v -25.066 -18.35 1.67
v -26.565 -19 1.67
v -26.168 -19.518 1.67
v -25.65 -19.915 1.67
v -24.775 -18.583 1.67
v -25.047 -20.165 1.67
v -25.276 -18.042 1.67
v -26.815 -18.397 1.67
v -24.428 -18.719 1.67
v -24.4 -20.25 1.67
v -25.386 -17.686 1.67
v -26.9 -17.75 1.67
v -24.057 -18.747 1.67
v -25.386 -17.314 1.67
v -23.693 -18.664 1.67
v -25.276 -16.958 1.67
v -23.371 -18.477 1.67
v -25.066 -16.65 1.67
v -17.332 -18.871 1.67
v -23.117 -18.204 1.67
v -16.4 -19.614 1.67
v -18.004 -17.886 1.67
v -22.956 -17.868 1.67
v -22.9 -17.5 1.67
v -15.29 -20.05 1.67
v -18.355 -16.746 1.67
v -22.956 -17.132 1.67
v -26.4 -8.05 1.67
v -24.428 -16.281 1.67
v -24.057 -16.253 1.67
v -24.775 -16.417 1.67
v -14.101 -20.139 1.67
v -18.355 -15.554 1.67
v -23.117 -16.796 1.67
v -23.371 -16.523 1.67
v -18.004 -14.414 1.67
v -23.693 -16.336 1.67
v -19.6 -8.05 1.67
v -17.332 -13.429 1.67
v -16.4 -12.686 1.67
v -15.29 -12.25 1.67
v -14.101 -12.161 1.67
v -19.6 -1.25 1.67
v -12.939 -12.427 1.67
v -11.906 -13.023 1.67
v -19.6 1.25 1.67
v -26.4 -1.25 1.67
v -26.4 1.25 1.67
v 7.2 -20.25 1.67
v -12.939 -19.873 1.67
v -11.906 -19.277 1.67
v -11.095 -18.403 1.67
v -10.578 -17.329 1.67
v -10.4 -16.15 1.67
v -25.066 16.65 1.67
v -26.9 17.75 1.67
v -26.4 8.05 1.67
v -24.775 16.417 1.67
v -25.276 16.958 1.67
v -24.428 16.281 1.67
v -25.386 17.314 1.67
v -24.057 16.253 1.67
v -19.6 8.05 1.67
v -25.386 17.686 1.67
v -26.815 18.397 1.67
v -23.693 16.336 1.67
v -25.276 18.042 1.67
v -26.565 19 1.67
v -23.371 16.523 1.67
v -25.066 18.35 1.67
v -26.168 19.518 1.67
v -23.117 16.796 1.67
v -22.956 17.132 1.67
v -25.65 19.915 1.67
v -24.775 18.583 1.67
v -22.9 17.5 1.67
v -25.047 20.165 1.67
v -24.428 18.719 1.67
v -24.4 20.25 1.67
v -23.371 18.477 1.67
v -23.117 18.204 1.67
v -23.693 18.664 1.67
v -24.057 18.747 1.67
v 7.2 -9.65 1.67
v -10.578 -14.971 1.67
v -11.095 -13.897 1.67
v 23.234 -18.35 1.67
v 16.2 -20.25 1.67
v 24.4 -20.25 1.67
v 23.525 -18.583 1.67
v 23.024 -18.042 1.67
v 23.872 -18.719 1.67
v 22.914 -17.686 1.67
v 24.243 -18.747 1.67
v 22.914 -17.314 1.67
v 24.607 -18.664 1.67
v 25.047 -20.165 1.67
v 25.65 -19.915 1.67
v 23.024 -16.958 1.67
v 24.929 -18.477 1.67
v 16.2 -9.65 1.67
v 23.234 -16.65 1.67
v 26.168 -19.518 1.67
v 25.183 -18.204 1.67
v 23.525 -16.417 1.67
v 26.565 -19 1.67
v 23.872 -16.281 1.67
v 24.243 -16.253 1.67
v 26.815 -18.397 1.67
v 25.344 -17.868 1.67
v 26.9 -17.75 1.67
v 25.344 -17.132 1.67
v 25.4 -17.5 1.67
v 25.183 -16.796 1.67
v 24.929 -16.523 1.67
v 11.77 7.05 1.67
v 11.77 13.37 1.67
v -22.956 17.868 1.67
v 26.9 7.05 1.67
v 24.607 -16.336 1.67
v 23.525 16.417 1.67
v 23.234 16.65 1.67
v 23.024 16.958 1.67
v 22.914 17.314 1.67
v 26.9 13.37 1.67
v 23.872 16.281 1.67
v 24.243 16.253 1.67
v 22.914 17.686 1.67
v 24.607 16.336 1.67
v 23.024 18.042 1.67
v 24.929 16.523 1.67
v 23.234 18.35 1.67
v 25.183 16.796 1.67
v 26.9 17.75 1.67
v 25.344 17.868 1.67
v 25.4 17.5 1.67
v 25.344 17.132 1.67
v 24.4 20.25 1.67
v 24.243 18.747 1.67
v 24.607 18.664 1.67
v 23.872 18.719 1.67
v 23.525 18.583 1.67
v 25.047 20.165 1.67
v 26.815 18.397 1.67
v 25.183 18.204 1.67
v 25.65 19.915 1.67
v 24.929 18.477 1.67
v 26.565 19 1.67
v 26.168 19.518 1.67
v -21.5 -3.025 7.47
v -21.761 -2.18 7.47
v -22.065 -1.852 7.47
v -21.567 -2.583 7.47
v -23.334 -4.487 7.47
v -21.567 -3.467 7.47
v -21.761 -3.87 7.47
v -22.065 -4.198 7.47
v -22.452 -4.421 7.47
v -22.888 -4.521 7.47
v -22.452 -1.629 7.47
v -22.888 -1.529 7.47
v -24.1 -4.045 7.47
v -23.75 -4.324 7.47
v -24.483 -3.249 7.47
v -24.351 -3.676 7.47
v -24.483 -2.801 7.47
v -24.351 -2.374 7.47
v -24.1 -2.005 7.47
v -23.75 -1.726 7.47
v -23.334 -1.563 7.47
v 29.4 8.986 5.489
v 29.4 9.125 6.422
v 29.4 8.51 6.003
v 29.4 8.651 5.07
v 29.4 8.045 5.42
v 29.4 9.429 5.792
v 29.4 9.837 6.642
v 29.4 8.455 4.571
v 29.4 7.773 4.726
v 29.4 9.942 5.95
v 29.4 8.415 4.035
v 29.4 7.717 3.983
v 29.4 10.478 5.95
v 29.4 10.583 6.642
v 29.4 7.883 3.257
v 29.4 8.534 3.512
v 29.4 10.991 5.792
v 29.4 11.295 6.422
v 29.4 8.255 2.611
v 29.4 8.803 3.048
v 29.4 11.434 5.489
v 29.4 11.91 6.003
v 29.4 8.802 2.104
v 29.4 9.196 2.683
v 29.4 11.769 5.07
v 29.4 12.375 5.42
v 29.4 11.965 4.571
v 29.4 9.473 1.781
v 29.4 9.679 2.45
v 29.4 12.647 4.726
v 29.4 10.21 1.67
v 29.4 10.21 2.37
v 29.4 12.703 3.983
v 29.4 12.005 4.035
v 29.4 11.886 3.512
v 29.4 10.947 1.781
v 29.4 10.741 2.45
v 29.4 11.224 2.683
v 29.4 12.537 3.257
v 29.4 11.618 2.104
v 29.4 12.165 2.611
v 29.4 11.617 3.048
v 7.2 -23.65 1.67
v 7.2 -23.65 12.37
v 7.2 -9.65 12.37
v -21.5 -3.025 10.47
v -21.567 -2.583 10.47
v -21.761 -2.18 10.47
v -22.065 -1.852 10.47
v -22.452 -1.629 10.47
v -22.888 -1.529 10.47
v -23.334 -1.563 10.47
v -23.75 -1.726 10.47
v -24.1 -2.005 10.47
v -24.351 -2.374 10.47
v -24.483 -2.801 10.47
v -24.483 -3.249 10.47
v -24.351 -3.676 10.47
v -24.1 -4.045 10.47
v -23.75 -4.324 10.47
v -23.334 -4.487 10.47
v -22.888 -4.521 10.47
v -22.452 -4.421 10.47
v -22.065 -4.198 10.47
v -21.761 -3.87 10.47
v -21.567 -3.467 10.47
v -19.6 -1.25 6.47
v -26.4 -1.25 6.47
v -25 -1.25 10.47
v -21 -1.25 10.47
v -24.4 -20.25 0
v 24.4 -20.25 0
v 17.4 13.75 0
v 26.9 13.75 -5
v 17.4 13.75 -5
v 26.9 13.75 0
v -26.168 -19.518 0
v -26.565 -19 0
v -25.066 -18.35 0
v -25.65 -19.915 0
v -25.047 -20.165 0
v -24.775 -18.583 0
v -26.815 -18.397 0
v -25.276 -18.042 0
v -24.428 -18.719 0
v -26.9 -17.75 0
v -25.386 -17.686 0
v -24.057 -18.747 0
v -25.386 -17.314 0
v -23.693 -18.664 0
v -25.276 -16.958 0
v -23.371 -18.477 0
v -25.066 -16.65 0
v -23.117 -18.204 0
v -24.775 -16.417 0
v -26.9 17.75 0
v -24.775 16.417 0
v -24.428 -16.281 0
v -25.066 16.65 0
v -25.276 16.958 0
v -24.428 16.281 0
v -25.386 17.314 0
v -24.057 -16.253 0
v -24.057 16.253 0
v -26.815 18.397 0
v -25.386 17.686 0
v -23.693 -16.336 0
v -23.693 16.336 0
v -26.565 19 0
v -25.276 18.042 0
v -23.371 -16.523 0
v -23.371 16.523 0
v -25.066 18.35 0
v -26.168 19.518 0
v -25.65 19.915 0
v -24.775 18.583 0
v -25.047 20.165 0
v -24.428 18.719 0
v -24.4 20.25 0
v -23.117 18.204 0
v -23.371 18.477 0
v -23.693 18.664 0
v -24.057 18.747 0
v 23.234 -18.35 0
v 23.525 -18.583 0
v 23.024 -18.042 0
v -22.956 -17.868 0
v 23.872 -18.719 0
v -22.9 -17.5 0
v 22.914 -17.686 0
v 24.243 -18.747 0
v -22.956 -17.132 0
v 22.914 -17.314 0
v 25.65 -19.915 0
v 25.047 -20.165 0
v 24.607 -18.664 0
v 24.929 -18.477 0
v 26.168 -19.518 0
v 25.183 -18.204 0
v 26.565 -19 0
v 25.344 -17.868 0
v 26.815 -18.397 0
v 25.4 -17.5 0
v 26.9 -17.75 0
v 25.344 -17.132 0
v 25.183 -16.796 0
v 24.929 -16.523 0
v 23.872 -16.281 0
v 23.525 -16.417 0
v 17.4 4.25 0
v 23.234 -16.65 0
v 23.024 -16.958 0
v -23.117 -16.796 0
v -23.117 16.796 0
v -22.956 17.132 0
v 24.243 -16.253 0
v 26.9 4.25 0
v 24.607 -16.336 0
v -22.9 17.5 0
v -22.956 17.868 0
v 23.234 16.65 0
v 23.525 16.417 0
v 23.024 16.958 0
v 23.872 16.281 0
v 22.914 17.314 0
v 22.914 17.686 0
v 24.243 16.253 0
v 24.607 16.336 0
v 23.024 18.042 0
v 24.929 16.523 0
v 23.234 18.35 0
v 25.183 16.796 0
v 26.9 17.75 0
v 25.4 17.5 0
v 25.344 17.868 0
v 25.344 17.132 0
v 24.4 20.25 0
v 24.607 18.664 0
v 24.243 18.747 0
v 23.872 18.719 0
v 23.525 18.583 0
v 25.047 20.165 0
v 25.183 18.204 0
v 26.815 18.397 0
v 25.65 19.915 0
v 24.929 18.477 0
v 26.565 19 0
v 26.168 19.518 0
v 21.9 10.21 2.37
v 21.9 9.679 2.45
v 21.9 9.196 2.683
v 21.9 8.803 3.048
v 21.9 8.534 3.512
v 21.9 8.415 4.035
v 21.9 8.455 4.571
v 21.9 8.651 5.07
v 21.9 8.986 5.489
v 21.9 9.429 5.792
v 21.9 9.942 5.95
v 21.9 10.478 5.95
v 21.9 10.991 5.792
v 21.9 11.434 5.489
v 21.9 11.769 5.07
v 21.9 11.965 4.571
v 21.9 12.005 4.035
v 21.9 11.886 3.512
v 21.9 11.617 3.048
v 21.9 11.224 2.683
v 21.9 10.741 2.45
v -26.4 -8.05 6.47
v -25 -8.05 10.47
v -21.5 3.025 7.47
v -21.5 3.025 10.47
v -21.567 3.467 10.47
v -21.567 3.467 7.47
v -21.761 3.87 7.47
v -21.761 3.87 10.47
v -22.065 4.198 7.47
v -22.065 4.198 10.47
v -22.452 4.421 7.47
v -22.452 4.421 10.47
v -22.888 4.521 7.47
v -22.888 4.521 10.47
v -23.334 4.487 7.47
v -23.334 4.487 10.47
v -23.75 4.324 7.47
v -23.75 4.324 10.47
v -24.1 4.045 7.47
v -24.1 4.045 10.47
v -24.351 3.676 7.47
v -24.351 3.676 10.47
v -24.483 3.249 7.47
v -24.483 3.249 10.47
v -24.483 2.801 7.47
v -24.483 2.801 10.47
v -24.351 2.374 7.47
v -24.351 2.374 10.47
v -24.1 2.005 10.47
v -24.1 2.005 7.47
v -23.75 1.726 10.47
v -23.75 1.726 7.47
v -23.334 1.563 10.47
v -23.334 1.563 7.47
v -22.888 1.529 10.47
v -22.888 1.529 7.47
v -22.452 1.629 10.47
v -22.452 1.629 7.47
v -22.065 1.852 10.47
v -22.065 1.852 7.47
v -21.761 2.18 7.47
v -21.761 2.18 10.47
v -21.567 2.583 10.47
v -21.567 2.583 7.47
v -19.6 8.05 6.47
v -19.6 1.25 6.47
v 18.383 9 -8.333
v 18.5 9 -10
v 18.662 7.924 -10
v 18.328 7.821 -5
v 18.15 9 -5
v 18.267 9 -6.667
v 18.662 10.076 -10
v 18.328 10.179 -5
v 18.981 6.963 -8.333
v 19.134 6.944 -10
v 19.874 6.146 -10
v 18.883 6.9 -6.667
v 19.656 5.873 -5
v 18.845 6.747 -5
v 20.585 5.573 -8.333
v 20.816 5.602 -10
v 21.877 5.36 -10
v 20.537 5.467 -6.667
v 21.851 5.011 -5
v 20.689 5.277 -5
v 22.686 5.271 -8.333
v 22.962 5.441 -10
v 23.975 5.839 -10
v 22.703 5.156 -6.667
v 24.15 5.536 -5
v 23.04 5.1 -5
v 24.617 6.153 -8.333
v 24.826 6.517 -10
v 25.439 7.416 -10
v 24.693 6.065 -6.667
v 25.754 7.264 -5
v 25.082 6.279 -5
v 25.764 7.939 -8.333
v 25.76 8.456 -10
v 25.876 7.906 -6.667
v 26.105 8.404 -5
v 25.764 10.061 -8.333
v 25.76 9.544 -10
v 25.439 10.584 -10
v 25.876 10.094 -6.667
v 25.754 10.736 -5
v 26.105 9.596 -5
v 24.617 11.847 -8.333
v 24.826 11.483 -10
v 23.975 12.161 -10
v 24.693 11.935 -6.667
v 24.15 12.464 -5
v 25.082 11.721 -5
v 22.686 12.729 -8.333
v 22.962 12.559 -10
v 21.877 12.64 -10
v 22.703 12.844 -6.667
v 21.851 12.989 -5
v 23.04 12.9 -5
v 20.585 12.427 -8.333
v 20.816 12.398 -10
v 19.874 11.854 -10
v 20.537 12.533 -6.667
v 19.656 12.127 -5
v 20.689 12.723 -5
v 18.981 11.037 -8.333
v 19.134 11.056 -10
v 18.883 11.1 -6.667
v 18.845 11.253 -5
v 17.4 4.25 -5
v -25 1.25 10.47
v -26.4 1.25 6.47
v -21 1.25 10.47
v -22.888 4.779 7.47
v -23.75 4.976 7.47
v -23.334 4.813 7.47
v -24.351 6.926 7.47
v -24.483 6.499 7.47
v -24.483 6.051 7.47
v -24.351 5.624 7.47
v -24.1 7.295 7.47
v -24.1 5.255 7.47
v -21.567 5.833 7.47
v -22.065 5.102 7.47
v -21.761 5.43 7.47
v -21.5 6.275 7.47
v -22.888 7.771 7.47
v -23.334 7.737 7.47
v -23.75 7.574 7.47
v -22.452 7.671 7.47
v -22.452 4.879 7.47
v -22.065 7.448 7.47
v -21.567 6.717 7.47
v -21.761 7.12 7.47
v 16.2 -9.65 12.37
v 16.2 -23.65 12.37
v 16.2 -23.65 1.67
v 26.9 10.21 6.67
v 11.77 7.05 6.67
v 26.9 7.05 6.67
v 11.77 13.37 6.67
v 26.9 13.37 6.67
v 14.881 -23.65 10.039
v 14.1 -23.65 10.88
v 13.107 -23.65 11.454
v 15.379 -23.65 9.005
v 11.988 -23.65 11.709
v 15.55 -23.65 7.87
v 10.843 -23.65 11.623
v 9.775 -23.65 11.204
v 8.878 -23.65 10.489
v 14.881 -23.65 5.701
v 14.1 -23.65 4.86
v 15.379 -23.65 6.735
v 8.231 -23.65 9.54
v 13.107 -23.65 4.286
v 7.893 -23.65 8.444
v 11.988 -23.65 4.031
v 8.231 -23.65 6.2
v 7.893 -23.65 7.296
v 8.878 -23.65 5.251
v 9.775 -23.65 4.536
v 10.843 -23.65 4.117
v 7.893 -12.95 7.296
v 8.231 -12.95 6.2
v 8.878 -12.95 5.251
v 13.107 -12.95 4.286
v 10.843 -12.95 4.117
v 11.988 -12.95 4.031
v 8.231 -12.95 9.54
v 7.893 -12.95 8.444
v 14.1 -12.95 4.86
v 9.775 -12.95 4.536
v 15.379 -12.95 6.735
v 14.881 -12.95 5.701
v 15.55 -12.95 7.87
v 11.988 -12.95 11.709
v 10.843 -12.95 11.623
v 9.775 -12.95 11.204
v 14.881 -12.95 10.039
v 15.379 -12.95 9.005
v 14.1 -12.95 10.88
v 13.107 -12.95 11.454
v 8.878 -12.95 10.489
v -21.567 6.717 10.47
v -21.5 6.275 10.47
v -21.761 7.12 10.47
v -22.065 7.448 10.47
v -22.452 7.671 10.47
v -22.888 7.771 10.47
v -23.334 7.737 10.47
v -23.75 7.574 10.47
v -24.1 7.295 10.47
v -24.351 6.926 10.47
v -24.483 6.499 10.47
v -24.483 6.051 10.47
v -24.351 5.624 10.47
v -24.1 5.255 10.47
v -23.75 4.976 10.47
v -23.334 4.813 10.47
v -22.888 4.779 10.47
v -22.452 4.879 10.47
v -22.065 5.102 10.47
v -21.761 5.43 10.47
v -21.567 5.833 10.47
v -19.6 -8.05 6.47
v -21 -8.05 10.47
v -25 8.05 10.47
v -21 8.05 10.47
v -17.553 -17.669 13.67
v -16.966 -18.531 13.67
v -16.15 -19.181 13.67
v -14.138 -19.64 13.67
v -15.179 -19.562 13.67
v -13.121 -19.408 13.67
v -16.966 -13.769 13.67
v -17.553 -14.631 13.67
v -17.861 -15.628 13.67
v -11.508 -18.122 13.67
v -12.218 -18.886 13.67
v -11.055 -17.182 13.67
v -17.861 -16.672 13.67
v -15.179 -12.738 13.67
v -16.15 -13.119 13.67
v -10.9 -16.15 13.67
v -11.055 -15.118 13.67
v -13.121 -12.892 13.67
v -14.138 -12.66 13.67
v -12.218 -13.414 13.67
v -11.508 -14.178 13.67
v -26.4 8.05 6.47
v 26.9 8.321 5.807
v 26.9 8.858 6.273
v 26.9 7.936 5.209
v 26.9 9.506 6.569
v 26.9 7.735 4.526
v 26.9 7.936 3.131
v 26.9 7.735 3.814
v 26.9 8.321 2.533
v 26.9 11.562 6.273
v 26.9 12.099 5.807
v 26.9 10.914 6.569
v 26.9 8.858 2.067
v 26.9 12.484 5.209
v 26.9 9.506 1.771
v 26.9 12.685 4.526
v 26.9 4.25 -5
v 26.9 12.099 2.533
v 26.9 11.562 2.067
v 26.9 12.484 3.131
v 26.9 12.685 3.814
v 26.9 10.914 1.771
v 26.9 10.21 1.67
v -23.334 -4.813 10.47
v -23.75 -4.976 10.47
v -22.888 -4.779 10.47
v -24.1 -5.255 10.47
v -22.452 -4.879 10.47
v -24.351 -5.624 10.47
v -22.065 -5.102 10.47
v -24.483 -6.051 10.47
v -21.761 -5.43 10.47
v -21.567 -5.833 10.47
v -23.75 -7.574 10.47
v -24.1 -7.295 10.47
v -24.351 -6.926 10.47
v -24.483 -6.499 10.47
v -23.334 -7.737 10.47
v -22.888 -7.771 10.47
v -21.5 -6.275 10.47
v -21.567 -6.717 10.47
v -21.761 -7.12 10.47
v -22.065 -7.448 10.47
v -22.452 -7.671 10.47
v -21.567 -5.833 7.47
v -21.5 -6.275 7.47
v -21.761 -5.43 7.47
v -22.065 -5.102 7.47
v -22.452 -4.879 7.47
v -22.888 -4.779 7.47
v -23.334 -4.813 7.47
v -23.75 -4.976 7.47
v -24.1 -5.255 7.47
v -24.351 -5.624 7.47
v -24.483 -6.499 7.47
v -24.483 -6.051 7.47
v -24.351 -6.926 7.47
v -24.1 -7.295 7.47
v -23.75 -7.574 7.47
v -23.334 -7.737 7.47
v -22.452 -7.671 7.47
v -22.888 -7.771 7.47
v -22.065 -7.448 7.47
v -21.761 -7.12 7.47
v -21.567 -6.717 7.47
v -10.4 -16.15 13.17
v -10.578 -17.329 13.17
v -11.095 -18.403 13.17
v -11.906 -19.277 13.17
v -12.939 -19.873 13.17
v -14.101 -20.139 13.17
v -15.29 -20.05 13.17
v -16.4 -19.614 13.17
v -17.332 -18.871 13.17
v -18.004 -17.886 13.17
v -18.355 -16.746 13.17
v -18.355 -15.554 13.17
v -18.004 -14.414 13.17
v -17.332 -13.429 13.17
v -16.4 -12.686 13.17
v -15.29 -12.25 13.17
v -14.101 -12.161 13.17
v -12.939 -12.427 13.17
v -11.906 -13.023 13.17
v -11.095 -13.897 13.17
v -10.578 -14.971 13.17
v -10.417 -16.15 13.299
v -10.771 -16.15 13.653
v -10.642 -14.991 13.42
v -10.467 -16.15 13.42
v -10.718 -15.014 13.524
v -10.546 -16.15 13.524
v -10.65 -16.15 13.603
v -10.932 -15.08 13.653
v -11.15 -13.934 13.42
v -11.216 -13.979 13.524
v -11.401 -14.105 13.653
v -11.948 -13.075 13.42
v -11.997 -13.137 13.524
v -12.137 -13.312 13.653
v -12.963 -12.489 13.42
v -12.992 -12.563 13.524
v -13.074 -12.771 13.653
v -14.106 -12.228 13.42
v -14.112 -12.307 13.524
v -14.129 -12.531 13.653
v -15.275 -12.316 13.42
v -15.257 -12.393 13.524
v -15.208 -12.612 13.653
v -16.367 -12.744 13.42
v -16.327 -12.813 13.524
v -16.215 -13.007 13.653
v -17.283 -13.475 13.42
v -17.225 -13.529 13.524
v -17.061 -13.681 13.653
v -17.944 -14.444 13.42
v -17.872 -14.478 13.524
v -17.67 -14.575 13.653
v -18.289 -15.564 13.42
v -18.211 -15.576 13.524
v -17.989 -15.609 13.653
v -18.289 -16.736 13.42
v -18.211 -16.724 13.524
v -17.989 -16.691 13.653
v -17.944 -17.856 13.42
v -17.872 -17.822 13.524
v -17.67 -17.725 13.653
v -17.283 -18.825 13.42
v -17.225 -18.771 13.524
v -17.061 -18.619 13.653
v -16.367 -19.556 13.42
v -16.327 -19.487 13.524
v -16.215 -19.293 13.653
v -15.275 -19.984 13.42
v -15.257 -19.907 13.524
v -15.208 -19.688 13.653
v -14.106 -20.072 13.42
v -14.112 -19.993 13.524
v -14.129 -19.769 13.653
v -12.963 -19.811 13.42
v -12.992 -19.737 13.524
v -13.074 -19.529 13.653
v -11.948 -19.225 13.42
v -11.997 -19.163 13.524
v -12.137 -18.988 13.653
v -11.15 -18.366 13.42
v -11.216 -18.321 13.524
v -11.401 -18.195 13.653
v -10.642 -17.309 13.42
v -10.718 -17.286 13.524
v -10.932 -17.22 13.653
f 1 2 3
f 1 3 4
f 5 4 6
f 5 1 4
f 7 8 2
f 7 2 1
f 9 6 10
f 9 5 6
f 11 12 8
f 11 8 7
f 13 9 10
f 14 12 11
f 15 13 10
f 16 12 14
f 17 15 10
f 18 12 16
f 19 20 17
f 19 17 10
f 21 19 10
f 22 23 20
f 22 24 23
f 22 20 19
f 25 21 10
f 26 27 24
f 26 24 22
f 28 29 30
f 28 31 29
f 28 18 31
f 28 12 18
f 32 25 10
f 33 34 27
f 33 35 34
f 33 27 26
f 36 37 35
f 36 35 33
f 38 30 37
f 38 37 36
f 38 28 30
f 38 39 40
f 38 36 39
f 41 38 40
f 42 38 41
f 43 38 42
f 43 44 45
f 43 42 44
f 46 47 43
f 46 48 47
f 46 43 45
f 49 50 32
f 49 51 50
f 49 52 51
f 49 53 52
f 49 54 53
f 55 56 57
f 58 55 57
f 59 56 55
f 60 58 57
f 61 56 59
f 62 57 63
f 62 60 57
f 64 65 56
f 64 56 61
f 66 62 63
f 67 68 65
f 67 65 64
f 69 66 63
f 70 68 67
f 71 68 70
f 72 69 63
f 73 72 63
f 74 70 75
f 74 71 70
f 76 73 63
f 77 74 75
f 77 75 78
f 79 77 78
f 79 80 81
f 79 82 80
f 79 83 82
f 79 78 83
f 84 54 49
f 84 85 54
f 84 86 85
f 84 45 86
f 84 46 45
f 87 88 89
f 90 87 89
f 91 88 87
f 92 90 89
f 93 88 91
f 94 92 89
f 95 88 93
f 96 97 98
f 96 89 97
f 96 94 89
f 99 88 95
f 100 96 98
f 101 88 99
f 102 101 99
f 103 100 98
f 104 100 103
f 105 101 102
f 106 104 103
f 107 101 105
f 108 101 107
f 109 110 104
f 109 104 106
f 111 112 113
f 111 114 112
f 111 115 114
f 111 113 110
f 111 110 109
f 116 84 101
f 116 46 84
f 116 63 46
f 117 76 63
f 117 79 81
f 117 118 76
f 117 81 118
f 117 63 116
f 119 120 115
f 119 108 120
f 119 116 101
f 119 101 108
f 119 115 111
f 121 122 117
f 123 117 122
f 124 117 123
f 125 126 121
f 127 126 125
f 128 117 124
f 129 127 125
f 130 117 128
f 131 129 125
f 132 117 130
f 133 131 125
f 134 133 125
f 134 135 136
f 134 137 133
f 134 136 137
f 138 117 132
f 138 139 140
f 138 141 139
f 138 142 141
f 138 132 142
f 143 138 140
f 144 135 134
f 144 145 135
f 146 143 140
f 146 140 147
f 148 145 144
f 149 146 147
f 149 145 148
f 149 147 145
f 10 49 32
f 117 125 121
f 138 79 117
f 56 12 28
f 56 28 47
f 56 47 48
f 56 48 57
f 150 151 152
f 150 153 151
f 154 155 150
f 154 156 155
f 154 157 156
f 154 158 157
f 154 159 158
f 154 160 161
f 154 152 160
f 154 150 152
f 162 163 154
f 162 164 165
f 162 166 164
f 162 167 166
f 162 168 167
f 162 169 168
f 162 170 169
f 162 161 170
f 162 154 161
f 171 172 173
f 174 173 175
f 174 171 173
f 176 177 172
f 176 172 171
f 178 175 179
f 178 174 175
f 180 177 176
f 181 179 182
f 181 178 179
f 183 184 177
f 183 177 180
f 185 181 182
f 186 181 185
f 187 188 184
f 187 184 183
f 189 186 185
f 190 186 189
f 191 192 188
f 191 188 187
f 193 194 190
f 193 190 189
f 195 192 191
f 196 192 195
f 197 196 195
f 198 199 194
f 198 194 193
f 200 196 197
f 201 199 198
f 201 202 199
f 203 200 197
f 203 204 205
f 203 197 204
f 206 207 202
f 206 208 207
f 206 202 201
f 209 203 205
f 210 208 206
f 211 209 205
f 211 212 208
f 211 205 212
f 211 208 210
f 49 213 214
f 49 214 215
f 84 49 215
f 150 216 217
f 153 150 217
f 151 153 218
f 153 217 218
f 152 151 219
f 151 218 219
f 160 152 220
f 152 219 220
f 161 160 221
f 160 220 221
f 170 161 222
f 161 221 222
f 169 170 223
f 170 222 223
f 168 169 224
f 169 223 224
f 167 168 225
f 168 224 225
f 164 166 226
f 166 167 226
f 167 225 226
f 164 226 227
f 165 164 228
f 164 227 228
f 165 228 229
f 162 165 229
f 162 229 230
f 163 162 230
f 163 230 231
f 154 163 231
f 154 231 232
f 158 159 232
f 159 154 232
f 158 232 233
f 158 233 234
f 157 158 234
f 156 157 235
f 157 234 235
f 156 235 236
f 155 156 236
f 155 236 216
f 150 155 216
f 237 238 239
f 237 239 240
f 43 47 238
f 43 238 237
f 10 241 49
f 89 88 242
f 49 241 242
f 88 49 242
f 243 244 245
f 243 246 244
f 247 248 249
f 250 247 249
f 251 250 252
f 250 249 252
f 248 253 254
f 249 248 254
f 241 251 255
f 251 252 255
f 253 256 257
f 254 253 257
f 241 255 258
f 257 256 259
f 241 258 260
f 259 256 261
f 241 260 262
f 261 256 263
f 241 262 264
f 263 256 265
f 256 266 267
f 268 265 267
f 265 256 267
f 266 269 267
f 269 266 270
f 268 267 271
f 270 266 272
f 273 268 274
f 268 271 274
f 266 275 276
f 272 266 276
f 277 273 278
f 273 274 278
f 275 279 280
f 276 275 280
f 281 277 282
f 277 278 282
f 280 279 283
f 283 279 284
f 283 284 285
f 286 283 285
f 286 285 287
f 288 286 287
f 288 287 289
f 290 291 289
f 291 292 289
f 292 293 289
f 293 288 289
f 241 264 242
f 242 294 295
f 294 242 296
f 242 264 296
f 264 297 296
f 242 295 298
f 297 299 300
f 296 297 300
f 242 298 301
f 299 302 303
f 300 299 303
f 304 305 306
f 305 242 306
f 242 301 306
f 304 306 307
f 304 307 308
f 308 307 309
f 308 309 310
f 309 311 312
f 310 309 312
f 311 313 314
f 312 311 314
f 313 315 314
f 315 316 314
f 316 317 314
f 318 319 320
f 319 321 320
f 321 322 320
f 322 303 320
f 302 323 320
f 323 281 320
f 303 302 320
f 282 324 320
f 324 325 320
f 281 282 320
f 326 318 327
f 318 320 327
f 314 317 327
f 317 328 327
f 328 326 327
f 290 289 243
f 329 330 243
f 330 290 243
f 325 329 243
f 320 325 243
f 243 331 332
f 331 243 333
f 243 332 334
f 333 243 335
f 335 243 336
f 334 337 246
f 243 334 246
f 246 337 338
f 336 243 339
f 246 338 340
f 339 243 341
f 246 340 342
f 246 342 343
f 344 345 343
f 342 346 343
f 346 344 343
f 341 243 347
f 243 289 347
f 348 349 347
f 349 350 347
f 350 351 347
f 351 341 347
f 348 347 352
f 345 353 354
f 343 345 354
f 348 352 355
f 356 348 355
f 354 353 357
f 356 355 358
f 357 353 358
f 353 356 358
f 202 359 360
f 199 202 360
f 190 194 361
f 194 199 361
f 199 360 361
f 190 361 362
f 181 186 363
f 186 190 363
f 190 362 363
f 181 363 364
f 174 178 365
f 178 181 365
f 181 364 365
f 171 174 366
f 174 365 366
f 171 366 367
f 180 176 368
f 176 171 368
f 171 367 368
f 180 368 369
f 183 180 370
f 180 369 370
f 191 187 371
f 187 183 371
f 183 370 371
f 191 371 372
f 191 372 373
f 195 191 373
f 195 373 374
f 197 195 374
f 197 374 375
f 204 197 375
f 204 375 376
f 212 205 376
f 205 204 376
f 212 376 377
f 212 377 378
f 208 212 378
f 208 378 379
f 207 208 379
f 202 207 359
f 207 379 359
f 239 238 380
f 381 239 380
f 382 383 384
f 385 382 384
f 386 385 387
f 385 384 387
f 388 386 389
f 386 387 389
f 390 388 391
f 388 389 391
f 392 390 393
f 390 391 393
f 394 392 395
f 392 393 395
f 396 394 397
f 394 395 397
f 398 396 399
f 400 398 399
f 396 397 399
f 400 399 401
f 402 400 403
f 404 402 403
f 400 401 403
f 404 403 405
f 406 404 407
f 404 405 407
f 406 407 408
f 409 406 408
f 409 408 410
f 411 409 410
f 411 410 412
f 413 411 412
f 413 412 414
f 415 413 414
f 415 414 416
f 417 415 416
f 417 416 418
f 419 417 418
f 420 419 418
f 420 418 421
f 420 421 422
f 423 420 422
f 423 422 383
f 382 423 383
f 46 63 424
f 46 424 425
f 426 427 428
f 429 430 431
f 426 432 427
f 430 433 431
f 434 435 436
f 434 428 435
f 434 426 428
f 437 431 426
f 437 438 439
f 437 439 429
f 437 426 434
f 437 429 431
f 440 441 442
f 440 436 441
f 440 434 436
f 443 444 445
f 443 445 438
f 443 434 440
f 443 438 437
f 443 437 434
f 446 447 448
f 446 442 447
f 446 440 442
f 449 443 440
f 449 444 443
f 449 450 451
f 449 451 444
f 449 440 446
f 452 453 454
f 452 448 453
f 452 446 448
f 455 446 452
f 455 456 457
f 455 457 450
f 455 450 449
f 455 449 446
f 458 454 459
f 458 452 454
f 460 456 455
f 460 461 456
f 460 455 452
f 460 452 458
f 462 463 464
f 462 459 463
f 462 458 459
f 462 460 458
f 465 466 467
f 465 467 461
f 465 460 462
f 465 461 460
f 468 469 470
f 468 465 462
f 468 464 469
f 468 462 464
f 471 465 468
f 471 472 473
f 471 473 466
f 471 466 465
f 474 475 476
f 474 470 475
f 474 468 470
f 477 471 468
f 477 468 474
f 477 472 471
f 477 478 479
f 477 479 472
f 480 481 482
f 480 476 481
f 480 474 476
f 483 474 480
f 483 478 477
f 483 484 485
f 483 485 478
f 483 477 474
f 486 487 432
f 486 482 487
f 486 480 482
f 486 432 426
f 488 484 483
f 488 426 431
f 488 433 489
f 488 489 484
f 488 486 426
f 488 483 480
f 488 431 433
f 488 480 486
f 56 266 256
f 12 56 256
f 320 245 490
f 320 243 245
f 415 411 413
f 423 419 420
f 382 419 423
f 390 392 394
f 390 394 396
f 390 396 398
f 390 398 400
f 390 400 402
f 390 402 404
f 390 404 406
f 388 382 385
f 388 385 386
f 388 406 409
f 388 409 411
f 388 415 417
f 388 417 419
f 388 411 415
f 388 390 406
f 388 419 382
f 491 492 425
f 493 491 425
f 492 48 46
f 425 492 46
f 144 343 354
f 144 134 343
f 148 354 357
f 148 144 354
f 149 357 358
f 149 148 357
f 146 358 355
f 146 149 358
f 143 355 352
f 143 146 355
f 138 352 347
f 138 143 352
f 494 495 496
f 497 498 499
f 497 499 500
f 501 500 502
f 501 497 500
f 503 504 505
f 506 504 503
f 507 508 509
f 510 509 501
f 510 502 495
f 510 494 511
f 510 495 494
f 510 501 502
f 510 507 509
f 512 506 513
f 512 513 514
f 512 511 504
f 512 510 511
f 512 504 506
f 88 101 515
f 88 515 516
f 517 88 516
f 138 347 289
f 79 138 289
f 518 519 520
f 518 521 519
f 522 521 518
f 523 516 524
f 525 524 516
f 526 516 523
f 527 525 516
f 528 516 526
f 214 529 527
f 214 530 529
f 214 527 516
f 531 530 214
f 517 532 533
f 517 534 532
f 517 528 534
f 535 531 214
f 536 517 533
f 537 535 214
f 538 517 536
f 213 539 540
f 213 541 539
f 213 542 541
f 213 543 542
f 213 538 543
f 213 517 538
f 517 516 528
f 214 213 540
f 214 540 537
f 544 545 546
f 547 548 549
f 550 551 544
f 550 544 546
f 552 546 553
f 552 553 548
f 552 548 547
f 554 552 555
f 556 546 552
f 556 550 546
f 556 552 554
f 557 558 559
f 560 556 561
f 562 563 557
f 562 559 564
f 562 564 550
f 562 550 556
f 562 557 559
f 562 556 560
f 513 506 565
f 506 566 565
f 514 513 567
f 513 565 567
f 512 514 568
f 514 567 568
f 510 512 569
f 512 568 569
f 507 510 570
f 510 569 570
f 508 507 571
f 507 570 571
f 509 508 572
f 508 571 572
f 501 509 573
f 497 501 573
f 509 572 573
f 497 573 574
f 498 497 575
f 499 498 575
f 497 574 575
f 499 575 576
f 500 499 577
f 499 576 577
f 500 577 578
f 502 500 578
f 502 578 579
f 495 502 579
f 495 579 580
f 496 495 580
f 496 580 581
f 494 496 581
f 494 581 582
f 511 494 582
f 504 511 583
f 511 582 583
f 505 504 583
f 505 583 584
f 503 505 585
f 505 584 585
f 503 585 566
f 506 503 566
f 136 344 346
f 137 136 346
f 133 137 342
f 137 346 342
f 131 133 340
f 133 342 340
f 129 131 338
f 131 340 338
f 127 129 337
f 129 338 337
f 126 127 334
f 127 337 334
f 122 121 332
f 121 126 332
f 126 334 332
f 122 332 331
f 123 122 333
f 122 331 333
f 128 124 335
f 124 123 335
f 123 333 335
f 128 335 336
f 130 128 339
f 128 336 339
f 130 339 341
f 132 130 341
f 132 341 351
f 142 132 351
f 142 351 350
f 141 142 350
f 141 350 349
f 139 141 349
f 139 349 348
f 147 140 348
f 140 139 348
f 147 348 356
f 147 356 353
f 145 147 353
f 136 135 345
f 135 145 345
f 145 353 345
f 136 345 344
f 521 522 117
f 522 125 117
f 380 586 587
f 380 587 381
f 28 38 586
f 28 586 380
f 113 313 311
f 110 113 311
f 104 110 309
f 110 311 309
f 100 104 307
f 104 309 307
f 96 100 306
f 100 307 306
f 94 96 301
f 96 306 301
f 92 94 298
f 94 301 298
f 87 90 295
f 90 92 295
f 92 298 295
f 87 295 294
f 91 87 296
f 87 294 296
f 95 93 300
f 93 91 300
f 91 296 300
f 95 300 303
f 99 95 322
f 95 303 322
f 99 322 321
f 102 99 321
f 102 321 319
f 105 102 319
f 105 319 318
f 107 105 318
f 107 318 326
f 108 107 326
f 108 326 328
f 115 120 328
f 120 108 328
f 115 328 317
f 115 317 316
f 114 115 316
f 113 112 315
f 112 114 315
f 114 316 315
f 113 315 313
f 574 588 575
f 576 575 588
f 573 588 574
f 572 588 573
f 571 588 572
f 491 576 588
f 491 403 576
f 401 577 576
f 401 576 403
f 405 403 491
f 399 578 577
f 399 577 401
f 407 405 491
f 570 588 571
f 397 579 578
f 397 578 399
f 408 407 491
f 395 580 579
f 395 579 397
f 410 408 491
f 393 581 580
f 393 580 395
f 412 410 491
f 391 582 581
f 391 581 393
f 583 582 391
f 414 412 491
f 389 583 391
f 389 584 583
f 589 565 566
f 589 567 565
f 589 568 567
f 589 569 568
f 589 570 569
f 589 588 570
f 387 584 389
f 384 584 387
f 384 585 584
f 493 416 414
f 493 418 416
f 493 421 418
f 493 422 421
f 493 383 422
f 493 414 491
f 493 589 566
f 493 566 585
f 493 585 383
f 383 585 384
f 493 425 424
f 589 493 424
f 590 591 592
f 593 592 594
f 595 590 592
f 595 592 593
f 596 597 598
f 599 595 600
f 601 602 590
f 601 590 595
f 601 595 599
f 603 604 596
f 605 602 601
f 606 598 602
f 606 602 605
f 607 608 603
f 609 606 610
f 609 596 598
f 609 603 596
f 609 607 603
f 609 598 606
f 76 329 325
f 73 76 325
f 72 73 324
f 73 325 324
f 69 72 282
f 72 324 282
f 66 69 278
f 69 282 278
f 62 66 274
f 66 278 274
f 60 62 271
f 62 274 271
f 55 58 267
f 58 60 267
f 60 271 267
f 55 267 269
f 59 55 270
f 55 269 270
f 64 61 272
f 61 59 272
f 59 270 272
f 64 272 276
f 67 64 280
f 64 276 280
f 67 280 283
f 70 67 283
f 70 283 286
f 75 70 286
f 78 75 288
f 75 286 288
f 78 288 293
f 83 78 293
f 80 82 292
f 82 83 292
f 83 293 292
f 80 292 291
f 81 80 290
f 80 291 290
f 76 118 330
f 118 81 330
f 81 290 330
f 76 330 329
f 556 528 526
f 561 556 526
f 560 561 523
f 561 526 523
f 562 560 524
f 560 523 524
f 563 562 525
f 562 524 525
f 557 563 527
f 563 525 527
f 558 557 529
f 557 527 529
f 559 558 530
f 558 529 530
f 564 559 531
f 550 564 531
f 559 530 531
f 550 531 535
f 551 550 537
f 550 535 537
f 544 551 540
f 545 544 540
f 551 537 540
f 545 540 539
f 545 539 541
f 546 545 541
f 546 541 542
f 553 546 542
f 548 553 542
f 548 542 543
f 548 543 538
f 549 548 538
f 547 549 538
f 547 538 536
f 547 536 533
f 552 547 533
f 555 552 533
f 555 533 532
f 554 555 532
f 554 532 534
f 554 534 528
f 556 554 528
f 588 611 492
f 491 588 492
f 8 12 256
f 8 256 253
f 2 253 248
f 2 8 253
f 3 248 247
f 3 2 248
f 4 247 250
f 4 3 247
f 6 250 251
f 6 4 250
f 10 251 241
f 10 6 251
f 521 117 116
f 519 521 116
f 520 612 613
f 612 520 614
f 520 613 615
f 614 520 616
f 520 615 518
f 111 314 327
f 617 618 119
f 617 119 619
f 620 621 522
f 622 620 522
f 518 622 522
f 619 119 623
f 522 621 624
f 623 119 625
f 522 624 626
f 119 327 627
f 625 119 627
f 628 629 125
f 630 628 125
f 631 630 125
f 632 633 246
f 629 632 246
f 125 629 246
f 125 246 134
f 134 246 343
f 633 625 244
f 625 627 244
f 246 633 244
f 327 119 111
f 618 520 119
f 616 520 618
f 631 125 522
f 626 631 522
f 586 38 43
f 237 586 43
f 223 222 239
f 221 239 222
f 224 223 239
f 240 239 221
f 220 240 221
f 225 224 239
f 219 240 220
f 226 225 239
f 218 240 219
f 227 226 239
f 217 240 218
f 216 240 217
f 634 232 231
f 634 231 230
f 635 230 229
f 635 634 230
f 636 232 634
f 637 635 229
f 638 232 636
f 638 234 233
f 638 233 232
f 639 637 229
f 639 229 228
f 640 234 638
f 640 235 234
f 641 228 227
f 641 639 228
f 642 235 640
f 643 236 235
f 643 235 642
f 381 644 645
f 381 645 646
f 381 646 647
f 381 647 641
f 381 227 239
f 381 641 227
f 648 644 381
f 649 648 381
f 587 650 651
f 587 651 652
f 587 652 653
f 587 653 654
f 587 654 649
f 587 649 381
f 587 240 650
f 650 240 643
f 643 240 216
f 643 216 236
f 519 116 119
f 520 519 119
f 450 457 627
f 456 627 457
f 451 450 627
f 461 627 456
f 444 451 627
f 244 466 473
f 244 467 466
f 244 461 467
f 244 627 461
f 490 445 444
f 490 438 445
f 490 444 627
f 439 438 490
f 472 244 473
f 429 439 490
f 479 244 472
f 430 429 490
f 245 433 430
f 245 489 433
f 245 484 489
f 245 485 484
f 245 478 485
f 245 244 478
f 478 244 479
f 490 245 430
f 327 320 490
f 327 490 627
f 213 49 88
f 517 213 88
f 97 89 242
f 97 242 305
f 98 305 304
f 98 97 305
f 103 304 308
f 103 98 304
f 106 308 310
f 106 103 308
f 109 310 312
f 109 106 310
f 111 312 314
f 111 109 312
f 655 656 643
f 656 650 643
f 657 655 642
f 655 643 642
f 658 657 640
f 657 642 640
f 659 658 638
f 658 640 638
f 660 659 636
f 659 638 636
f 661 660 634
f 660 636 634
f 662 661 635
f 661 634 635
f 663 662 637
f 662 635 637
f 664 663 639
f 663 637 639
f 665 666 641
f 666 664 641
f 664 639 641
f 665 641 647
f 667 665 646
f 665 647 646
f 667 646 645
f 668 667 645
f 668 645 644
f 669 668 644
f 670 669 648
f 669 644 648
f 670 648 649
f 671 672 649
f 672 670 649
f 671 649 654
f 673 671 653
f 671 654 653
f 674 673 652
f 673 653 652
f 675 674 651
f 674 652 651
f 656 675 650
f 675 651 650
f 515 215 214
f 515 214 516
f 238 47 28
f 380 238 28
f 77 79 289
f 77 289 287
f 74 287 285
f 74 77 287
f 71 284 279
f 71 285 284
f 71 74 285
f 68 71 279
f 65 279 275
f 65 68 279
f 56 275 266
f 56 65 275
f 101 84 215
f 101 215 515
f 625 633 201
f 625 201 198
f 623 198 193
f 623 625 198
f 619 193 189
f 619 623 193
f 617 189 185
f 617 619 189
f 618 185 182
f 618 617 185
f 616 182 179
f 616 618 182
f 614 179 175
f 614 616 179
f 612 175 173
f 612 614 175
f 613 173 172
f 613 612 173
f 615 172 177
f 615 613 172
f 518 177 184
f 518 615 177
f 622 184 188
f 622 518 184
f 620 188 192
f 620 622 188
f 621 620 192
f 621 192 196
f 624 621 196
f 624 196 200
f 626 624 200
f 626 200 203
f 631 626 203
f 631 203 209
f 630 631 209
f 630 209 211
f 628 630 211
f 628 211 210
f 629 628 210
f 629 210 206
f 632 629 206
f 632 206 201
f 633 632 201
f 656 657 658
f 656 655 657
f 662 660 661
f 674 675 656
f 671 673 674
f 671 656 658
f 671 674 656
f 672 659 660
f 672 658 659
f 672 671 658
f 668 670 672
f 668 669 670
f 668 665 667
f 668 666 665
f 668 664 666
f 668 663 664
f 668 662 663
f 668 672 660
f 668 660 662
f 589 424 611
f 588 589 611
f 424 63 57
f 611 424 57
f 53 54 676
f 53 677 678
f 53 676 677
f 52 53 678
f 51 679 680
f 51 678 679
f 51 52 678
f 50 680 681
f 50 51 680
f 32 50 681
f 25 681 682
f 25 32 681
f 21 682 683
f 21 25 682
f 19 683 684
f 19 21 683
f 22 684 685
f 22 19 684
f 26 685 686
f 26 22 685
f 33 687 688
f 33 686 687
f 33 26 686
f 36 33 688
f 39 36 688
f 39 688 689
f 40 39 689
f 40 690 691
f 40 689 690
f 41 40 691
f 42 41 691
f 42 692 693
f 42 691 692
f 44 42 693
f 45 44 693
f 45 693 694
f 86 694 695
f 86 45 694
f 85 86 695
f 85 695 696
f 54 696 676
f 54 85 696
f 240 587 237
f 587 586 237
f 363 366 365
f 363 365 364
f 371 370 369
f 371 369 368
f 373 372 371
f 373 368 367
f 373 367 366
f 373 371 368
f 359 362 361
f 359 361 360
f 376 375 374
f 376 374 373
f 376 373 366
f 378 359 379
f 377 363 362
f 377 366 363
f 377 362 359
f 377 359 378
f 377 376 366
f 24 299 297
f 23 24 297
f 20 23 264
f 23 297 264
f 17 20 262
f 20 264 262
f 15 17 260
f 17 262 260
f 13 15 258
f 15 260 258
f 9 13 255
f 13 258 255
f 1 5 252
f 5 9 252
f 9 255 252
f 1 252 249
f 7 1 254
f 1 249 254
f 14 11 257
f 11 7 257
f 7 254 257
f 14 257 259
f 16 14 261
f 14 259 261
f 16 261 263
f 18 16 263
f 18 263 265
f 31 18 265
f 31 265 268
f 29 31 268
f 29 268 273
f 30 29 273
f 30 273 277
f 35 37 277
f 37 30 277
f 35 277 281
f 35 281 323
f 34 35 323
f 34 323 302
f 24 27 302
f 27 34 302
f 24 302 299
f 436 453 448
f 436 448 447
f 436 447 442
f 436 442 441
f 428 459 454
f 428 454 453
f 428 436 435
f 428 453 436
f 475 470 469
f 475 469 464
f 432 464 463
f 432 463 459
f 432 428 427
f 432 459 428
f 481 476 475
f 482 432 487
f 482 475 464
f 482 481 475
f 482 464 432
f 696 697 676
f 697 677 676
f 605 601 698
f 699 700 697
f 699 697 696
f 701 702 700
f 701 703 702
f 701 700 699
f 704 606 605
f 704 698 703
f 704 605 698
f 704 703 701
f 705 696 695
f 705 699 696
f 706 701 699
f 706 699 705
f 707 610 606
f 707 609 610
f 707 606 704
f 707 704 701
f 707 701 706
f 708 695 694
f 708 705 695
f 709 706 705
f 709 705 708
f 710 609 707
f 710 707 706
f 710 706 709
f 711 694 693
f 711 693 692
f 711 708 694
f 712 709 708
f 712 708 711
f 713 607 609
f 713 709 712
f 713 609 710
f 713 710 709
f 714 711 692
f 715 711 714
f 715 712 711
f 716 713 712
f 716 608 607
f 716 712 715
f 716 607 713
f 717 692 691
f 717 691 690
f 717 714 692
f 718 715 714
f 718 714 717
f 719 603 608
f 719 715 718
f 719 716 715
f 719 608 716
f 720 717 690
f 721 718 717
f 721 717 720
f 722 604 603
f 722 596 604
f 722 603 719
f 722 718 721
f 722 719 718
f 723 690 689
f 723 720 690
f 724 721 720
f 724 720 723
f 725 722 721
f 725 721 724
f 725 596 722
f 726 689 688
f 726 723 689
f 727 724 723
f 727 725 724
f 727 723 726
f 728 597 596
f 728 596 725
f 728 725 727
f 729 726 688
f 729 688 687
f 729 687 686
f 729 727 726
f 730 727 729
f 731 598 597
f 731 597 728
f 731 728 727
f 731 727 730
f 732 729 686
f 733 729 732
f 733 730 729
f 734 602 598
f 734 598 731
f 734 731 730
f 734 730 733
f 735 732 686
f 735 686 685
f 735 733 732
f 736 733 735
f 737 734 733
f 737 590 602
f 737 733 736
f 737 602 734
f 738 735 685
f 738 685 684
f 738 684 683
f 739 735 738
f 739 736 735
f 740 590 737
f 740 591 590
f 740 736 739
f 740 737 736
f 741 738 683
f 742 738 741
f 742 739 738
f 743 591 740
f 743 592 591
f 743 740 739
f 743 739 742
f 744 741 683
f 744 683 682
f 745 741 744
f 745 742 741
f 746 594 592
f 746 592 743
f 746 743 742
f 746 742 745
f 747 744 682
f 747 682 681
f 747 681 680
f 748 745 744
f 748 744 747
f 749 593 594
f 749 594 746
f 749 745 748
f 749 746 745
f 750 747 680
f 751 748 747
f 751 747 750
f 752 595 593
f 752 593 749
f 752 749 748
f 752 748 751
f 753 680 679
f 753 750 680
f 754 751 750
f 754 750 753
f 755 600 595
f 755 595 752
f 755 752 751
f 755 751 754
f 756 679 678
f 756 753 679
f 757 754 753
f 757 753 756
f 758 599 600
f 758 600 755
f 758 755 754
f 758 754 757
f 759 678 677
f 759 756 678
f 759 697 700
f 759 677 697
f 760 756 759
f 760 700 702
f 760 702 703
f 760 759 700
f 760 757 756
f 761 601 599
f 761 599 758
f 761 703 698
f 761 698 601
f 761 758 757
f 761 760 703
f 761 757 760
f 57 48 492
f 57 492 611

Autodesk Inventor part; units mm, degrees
ref_plane "YZ Plane" through (0, 0, 0) normal (1, 0, 0) x (0, 1, 0)
ref_plane "XZ Plane" through (0, 0, 0) normal (0, 1, 0) x (-1, 0, 0)
sketch "Base" plane through (0, 0, 0) normal (0, 0, 1) x (1, 0, 0)
  line L0 (-26.9, -20.25) -> (26.9, -20.25)
  line L1 (26.9, -20.25) -> (26.9, 20.25)
  line L2 (26.9, 20.25) -> (-26.9, 20.25)
  line L3 (-26.9, 20.25) -> (-26.9, -20.25)
  line L4 (-26.9, -20.25) -> (26.9, 20.25) construction
  line L5 (26.9, -20.25) -> (-26.9, 20.25) construction
  line L6 (-25.4, 16.25) -> (-22.9, 16.25) construction
  line L7 (-22.9, 16.25) -> (-22.9, 18.75) construction
  line L8 (-22.9, 18.75) -> (-25.4, 18.75) construction
  line L9 (-25.4, 18.75) -> (-25.4, 16.25) construction
  line L10 (-25.4, 16.25) -> (-22.9, 18.75) construction
  line L11 (-22.9, 16.25) -> (-25.4, 18.75) construction
  circle A0 centre (-24.15, 17.5) radius 1.25
  line L12 (-26.9, 0) -> (0, 0) construction
  line L13 (0, 20.25) -> (0, 0) construction
  circle A1 centre (-24.15, -17.5) radius 1.25
  circle A2 centre (24.15, 17.5) radius 1.25
  circle A3 centre (24.15, -17.5) radius 1.25
  point P0 (-25.4, 17.5)
  dimension "d0" = 53.8
  dimension "d1" = 40.5
  dimension "d2" = 1.5
  dimension "d3" = 1.5
  dimension "d4" = 2.5
extrude "BaseFeature" add sketch "Base" along normal blind 1.67
fillet "Fillet1" radius 2.5 4 edges at (-26.9, -20.25, 0.835) (26.9, -20.25, 0.835) (-26.9, 20.25, 0.835) (26.9, 20.25, 0.835)
sketch "Sketch2" plane through (0, 0, 1.67) normal (0, 0, 1) x (1, 0, 0)
  line L0 (-26.9, 17.75) -> (-26.9, -17.75) projected
  line L1 (-26.9, 0) -> (0, 0) construction
  line L2 (-26.4, 8.05) -> (-19.6, 8.05)
  line L3 (-19.6, 8.05) -> (-19.6, 1.25)
  line L4 (-19.6, 1.25) -> (-26.4, 1.25)
  line L5 (-26.4, 1.25) -> (-26.4, 8.05)
  line L6 (-26.4, -8.05) -> (-19.6, -8.05)
  line L7 (-19.6, -8.05) -> (-19.6, -1.25)
  line L8 (-19.6, -1.25) -> (-26.4, -1.25)
  line L9 (-26.4, -1.25) -> (-26.4, -8.05)
  dimension "d8" = 1.25
  dimension "d9" = 0.5
  dimension "d10" = 6.8
extrude "Extrusion2" add sketch "Sketch2" along normal blind 4.8
ref_plane "Work Plane1" through (0, 0, 10.47) normal (0, 0, 1) x (1, 0, 0)
sketch "Sketch3" plane through (0, 0, 10.47) normal (0, 0, 1) x (1, 0, 0)
  line L0 (-26.4, 8.05) -> (-19.6, 8.05) projected
  line L1 (-23, 8.05) -> (-23, 1.25) construction
  line L2 (-19.6, 1.25) -> (-26.4, 1.25) projected
  line L3 (-37.66, 0) -> (37.66, 0) construction
  line L4 (-26.4, 1.25) -> (-19.6, 1.25) projected
  line L5 (-19.6, 1.25) -> (-19.6, 8.05) projected
  line L6 (-19.6, 8.05) -> (-26.4, 8.05) projected
  line L7 (-26.4, 8.05) -> (-26.4, 1.25) projected
  line L8 (-25, 8.05) -> (-21, 8.05)
  line L9 (-21, 8.05) -> (-21, 1.25)
  line L10 (-21, 1.25) -> (-25, 1.25)
  line L11 (-25, 1.25) -> (-25, 8.05)
  point P0 (0, 0)
  dimension "d14" = 4
sketch "Sketch4" plane through (0, 0, 6.47) normal (0, 0, 1) x (1, 0, 0)
  line L0 (-26.4, 1.25) -> (-19.6, 1.25) projected
  line L1 (-19.6, 1.25) -> (-19.6, 8.05) projected
  line L2 (-19.6, 8.05) -> (-26.4, 8.05) projected
  line L3 (-26.4, 8.05) -> (-26.4, 1.25) projected
  point P0 (0, 0)
loft "Loft1" add profiles "Sketch3" section 2 edges at (-23, 1.25, 6.47) (-19.6, 4.65, 6.47) (-23, 8.05, 6.47) (-26.4, 4.65, 6.47) contours L0 L9 L2 L11
mirror "Mirror1" about plane through (0, 0, 0) normal (0, 1, 0) of "Loft1"
sketch "Sketch5" plane through (-25, 1.25, 10.47) normal (0, 0, 1) x (1, 0, 0)
  line L0 (0, 6.8) -> (0, 0) projected
  line L1 (0, 0) -> (4, 0) projected
  line L2 (4, 0) -> (4, 6.8) projected
  line L3 (4, 6.8) -> (0, 6.8) projected
  line L4 (-12.66, -1.25) -> (62.66, -1.25) construction
  line L5 (2, 6.8) -> (2, 0) construction
  circle A0 centre (2, 5.025) radius 1.5
  line L6 (0, 3.4) -> (4, 3.4) construction
  circle A1 centre (2, 1.775) radius 1.5
  point P0 (25, -1.25)
  dimension "d19" = 3
  dimension "d20" = 3.25
extrude "Extrusion3" cut sketch "Sketch5" against normal blind 3 contours A0 | A1
mirror "Mirror2" about plane through (0, 0, 0) normal (0, 1, 0) of "Extrusion3"
sketch "Sketch6" plane through (0, 0, 1.67) normal (0, 0, 1) x (1, 0, 0)
  line L0 (-24.4, -20.25) -> (24.4, -20.25) projected
  line L1 (-26.9, 17.75) -> (-26.9, -17.75) projected
  circle A0 centre (-14.4, -16.15) radius 4
  line L2 (-18.4, -16.15) -> (-18.4, -20.25) construction
  point P0 (0, 0)
  dimension "d23" = 8
  dimension "d24" = 4.1
  dimension "d25" = 8.5
extrude "Extrusion4" add sketch "Sketch6" along normal blind 12
fillet "Fillet2" radius 0.5 1 edges at (-18.4, -16.15, 13.67)
sketch "Sketch7" plane through (0, 0, 1.67) normal (0, 0, 1) x (1, 0, 0)
  line L0 (7.2, -9.65) -> (16.2, -9.65)
  line L1 (16.2, -9.65) -> (16.2, -23.65)
  line L2 (16.2, -23.65) -> (7.2, -23.65)
  line L3 (7.2, -23.65) -> (7.2, -9.65)
  line L4 (7.2, -23.65) -> (16.2, -23.65)
  line L5 (16.2, -23.65) -> (16.2, -20.25)
  line L6 (16.2, -20.25) -> (7.2, -20.25)
  line L7 (7.2, -20.25) -> (7.2, -23.65)
  line L8 (-24.4, -20.25) -> (24.4, -20.25) projected
  line L9 (26.9, -17.75) -> (26.9, 17.75) projected
  point P0 (0, 0)
  point P1 (11.7, -23.65)
  dimension "d29" = 9
  dimension "d30" = 14
  dimension "d31" = 3.4
  dimension "d32" = 10.7
extrude "Extrusion5" add sketch "Sketch7" along normal blind 10.7
sketch "Sketch8" plane through (7.2, -23.65, 1.67) normal (0, -1, 0) x (1, 0, 0)
  line L0 (0, 0) -> (9, 0) projected
  line L1 (9, 0) -> (9, 10.7) projected
  line L2 (0, 10.7) -> (9, 10.7) projected
  line L3 (0, 0) -> (0, 10.7) projected
  line L4 (4.5, 10.7) -> (4.5, 0) construction
  circle A0 centre (4.5, 6.2) radius 3.85
  point P0 (-7.2, -1.67)
  dimension "d35" = 7.7
  dimension "d36" = 4.5
extrude "Extrusion6" cut sketch "Sketch8" against normal blind 10.7 contours A0
sketch "Sketch9" plane through (0, 0, 1.67) normal (0, 0, 1) x (1, 0, 0)
  line L0 (11.77, 7.05) -> (29.4, 7.05)
  line L1 (29.4, 7.05) -> (29.4, 13.37)
  line L2 (29.4, 13.37) -> (11.77, 13.37)
  line L3 (11.77, 13.37) -> (11.77, 7.05)
  line L4 (24.4, 20.25) -> (-24.4, 20.25) projected
  line L5 (26.9, 13.37) -> (26.9, 7.05)
  line L6 (26.9, -17.75) -> (26.9, 17.75) projected
  point P0 (0, 0)
  dimension "d39" = 13.2
  dimension "d40" = 6.32
  dimension "d41" = 17.63
  dimension "d42" = 2.5
extrude "Extrusion7" add sketch "Sketch9" along normal blind 5 contours L3 L2 L5 L0
sketch "Sketch10" plane through (26.9, -17.75, 0) normal (1, 0, 0) x (0, 0, -1)
  line L0 (-1.67, 24.8) -> (-6.67, 24.8) construction
  line L1 (-1.67, 31.12) -> (-6.67, 31.12) construction
  line L2 (-6.67, 24.8) -> (-1.67, 31.12) construction
  circle A0 centre (-4.17, 27.96) radius 1.8
  point P0 (0, 17.75)
  dimension "d45" = 3.6
extrude "Extrusion8" cut sketch "Sketch10" against normal blind 5
sketch "Sketch11" plane through (26.9, -17.75, 0) normal (1, 0, 0) x (0, 0, -1)
  circle A0 centre (-4.17, 27.96) radius 1.8 projected
  line L0 (-6.67, 24.8) -> (-6.67, 31.12) projected
  circle A1 centre (-4.17, 27.96) radius 2.5
  point P0 (0, 17.75)
extrude "Extrusion9" add sketch "Sketch11" along normal blind 2.5
sketch "Sketch12" plane through (0, 0, 0) normal (0, 0, -1) x (-1, 0, 0)
  line L0 (-26.9, 13.75) -> (-17.4, 13.75)
  line L1 (-17.4, 13.75) -> (-17.4, 4.25)
  line L2 (-17.4, 4.25) -> (-26.9, 4.25)
  line L3 (-26.9, 4.25) -> (-26.9, 13.75)
  line L4 (-26.9, -17.75) -> (-26.9, 17.75) projected
  line L5 (-24.4, 20.25) -> (24.4, 20.25) projected
  point P0 (0, 0)
  dimension "d50" = 9.5
  dimension "d51" = 6.5
extrude "Extrusion10" add sketch "Sketch12" along normal blind 5
sketch "Sketch13" plane through (0, 0, -5) normal (0, 0, -1) x (-1, 0, 0)
  line L0 (-17.4, 13.75) -> (-26.9, 13.75) projected
  line L1 (-26.9, 13.75) -> (-26.9, 4.25) projected
  line L2 (-26.9, 4.25) -> (-17.4, 4.25) projected
  line L3 (-17.4, 4.25) -> (-17.4, 13.75) projected
  circle A0 centre (-22.15, 9) radius 4
  line L4 (-17.4, 13.75) -> (-17.4, 4.25) projected
  line L5 (-26.9, 13.75) -> (-17.4, 4.25) construction
  point P0 (0, 0)
  dimension "d54" = 8
extrude "Extrusion11" add sketch "Sketch13" along normal blind 5 draft -4 contours A0
properties part number "FaceAudioBoard"
